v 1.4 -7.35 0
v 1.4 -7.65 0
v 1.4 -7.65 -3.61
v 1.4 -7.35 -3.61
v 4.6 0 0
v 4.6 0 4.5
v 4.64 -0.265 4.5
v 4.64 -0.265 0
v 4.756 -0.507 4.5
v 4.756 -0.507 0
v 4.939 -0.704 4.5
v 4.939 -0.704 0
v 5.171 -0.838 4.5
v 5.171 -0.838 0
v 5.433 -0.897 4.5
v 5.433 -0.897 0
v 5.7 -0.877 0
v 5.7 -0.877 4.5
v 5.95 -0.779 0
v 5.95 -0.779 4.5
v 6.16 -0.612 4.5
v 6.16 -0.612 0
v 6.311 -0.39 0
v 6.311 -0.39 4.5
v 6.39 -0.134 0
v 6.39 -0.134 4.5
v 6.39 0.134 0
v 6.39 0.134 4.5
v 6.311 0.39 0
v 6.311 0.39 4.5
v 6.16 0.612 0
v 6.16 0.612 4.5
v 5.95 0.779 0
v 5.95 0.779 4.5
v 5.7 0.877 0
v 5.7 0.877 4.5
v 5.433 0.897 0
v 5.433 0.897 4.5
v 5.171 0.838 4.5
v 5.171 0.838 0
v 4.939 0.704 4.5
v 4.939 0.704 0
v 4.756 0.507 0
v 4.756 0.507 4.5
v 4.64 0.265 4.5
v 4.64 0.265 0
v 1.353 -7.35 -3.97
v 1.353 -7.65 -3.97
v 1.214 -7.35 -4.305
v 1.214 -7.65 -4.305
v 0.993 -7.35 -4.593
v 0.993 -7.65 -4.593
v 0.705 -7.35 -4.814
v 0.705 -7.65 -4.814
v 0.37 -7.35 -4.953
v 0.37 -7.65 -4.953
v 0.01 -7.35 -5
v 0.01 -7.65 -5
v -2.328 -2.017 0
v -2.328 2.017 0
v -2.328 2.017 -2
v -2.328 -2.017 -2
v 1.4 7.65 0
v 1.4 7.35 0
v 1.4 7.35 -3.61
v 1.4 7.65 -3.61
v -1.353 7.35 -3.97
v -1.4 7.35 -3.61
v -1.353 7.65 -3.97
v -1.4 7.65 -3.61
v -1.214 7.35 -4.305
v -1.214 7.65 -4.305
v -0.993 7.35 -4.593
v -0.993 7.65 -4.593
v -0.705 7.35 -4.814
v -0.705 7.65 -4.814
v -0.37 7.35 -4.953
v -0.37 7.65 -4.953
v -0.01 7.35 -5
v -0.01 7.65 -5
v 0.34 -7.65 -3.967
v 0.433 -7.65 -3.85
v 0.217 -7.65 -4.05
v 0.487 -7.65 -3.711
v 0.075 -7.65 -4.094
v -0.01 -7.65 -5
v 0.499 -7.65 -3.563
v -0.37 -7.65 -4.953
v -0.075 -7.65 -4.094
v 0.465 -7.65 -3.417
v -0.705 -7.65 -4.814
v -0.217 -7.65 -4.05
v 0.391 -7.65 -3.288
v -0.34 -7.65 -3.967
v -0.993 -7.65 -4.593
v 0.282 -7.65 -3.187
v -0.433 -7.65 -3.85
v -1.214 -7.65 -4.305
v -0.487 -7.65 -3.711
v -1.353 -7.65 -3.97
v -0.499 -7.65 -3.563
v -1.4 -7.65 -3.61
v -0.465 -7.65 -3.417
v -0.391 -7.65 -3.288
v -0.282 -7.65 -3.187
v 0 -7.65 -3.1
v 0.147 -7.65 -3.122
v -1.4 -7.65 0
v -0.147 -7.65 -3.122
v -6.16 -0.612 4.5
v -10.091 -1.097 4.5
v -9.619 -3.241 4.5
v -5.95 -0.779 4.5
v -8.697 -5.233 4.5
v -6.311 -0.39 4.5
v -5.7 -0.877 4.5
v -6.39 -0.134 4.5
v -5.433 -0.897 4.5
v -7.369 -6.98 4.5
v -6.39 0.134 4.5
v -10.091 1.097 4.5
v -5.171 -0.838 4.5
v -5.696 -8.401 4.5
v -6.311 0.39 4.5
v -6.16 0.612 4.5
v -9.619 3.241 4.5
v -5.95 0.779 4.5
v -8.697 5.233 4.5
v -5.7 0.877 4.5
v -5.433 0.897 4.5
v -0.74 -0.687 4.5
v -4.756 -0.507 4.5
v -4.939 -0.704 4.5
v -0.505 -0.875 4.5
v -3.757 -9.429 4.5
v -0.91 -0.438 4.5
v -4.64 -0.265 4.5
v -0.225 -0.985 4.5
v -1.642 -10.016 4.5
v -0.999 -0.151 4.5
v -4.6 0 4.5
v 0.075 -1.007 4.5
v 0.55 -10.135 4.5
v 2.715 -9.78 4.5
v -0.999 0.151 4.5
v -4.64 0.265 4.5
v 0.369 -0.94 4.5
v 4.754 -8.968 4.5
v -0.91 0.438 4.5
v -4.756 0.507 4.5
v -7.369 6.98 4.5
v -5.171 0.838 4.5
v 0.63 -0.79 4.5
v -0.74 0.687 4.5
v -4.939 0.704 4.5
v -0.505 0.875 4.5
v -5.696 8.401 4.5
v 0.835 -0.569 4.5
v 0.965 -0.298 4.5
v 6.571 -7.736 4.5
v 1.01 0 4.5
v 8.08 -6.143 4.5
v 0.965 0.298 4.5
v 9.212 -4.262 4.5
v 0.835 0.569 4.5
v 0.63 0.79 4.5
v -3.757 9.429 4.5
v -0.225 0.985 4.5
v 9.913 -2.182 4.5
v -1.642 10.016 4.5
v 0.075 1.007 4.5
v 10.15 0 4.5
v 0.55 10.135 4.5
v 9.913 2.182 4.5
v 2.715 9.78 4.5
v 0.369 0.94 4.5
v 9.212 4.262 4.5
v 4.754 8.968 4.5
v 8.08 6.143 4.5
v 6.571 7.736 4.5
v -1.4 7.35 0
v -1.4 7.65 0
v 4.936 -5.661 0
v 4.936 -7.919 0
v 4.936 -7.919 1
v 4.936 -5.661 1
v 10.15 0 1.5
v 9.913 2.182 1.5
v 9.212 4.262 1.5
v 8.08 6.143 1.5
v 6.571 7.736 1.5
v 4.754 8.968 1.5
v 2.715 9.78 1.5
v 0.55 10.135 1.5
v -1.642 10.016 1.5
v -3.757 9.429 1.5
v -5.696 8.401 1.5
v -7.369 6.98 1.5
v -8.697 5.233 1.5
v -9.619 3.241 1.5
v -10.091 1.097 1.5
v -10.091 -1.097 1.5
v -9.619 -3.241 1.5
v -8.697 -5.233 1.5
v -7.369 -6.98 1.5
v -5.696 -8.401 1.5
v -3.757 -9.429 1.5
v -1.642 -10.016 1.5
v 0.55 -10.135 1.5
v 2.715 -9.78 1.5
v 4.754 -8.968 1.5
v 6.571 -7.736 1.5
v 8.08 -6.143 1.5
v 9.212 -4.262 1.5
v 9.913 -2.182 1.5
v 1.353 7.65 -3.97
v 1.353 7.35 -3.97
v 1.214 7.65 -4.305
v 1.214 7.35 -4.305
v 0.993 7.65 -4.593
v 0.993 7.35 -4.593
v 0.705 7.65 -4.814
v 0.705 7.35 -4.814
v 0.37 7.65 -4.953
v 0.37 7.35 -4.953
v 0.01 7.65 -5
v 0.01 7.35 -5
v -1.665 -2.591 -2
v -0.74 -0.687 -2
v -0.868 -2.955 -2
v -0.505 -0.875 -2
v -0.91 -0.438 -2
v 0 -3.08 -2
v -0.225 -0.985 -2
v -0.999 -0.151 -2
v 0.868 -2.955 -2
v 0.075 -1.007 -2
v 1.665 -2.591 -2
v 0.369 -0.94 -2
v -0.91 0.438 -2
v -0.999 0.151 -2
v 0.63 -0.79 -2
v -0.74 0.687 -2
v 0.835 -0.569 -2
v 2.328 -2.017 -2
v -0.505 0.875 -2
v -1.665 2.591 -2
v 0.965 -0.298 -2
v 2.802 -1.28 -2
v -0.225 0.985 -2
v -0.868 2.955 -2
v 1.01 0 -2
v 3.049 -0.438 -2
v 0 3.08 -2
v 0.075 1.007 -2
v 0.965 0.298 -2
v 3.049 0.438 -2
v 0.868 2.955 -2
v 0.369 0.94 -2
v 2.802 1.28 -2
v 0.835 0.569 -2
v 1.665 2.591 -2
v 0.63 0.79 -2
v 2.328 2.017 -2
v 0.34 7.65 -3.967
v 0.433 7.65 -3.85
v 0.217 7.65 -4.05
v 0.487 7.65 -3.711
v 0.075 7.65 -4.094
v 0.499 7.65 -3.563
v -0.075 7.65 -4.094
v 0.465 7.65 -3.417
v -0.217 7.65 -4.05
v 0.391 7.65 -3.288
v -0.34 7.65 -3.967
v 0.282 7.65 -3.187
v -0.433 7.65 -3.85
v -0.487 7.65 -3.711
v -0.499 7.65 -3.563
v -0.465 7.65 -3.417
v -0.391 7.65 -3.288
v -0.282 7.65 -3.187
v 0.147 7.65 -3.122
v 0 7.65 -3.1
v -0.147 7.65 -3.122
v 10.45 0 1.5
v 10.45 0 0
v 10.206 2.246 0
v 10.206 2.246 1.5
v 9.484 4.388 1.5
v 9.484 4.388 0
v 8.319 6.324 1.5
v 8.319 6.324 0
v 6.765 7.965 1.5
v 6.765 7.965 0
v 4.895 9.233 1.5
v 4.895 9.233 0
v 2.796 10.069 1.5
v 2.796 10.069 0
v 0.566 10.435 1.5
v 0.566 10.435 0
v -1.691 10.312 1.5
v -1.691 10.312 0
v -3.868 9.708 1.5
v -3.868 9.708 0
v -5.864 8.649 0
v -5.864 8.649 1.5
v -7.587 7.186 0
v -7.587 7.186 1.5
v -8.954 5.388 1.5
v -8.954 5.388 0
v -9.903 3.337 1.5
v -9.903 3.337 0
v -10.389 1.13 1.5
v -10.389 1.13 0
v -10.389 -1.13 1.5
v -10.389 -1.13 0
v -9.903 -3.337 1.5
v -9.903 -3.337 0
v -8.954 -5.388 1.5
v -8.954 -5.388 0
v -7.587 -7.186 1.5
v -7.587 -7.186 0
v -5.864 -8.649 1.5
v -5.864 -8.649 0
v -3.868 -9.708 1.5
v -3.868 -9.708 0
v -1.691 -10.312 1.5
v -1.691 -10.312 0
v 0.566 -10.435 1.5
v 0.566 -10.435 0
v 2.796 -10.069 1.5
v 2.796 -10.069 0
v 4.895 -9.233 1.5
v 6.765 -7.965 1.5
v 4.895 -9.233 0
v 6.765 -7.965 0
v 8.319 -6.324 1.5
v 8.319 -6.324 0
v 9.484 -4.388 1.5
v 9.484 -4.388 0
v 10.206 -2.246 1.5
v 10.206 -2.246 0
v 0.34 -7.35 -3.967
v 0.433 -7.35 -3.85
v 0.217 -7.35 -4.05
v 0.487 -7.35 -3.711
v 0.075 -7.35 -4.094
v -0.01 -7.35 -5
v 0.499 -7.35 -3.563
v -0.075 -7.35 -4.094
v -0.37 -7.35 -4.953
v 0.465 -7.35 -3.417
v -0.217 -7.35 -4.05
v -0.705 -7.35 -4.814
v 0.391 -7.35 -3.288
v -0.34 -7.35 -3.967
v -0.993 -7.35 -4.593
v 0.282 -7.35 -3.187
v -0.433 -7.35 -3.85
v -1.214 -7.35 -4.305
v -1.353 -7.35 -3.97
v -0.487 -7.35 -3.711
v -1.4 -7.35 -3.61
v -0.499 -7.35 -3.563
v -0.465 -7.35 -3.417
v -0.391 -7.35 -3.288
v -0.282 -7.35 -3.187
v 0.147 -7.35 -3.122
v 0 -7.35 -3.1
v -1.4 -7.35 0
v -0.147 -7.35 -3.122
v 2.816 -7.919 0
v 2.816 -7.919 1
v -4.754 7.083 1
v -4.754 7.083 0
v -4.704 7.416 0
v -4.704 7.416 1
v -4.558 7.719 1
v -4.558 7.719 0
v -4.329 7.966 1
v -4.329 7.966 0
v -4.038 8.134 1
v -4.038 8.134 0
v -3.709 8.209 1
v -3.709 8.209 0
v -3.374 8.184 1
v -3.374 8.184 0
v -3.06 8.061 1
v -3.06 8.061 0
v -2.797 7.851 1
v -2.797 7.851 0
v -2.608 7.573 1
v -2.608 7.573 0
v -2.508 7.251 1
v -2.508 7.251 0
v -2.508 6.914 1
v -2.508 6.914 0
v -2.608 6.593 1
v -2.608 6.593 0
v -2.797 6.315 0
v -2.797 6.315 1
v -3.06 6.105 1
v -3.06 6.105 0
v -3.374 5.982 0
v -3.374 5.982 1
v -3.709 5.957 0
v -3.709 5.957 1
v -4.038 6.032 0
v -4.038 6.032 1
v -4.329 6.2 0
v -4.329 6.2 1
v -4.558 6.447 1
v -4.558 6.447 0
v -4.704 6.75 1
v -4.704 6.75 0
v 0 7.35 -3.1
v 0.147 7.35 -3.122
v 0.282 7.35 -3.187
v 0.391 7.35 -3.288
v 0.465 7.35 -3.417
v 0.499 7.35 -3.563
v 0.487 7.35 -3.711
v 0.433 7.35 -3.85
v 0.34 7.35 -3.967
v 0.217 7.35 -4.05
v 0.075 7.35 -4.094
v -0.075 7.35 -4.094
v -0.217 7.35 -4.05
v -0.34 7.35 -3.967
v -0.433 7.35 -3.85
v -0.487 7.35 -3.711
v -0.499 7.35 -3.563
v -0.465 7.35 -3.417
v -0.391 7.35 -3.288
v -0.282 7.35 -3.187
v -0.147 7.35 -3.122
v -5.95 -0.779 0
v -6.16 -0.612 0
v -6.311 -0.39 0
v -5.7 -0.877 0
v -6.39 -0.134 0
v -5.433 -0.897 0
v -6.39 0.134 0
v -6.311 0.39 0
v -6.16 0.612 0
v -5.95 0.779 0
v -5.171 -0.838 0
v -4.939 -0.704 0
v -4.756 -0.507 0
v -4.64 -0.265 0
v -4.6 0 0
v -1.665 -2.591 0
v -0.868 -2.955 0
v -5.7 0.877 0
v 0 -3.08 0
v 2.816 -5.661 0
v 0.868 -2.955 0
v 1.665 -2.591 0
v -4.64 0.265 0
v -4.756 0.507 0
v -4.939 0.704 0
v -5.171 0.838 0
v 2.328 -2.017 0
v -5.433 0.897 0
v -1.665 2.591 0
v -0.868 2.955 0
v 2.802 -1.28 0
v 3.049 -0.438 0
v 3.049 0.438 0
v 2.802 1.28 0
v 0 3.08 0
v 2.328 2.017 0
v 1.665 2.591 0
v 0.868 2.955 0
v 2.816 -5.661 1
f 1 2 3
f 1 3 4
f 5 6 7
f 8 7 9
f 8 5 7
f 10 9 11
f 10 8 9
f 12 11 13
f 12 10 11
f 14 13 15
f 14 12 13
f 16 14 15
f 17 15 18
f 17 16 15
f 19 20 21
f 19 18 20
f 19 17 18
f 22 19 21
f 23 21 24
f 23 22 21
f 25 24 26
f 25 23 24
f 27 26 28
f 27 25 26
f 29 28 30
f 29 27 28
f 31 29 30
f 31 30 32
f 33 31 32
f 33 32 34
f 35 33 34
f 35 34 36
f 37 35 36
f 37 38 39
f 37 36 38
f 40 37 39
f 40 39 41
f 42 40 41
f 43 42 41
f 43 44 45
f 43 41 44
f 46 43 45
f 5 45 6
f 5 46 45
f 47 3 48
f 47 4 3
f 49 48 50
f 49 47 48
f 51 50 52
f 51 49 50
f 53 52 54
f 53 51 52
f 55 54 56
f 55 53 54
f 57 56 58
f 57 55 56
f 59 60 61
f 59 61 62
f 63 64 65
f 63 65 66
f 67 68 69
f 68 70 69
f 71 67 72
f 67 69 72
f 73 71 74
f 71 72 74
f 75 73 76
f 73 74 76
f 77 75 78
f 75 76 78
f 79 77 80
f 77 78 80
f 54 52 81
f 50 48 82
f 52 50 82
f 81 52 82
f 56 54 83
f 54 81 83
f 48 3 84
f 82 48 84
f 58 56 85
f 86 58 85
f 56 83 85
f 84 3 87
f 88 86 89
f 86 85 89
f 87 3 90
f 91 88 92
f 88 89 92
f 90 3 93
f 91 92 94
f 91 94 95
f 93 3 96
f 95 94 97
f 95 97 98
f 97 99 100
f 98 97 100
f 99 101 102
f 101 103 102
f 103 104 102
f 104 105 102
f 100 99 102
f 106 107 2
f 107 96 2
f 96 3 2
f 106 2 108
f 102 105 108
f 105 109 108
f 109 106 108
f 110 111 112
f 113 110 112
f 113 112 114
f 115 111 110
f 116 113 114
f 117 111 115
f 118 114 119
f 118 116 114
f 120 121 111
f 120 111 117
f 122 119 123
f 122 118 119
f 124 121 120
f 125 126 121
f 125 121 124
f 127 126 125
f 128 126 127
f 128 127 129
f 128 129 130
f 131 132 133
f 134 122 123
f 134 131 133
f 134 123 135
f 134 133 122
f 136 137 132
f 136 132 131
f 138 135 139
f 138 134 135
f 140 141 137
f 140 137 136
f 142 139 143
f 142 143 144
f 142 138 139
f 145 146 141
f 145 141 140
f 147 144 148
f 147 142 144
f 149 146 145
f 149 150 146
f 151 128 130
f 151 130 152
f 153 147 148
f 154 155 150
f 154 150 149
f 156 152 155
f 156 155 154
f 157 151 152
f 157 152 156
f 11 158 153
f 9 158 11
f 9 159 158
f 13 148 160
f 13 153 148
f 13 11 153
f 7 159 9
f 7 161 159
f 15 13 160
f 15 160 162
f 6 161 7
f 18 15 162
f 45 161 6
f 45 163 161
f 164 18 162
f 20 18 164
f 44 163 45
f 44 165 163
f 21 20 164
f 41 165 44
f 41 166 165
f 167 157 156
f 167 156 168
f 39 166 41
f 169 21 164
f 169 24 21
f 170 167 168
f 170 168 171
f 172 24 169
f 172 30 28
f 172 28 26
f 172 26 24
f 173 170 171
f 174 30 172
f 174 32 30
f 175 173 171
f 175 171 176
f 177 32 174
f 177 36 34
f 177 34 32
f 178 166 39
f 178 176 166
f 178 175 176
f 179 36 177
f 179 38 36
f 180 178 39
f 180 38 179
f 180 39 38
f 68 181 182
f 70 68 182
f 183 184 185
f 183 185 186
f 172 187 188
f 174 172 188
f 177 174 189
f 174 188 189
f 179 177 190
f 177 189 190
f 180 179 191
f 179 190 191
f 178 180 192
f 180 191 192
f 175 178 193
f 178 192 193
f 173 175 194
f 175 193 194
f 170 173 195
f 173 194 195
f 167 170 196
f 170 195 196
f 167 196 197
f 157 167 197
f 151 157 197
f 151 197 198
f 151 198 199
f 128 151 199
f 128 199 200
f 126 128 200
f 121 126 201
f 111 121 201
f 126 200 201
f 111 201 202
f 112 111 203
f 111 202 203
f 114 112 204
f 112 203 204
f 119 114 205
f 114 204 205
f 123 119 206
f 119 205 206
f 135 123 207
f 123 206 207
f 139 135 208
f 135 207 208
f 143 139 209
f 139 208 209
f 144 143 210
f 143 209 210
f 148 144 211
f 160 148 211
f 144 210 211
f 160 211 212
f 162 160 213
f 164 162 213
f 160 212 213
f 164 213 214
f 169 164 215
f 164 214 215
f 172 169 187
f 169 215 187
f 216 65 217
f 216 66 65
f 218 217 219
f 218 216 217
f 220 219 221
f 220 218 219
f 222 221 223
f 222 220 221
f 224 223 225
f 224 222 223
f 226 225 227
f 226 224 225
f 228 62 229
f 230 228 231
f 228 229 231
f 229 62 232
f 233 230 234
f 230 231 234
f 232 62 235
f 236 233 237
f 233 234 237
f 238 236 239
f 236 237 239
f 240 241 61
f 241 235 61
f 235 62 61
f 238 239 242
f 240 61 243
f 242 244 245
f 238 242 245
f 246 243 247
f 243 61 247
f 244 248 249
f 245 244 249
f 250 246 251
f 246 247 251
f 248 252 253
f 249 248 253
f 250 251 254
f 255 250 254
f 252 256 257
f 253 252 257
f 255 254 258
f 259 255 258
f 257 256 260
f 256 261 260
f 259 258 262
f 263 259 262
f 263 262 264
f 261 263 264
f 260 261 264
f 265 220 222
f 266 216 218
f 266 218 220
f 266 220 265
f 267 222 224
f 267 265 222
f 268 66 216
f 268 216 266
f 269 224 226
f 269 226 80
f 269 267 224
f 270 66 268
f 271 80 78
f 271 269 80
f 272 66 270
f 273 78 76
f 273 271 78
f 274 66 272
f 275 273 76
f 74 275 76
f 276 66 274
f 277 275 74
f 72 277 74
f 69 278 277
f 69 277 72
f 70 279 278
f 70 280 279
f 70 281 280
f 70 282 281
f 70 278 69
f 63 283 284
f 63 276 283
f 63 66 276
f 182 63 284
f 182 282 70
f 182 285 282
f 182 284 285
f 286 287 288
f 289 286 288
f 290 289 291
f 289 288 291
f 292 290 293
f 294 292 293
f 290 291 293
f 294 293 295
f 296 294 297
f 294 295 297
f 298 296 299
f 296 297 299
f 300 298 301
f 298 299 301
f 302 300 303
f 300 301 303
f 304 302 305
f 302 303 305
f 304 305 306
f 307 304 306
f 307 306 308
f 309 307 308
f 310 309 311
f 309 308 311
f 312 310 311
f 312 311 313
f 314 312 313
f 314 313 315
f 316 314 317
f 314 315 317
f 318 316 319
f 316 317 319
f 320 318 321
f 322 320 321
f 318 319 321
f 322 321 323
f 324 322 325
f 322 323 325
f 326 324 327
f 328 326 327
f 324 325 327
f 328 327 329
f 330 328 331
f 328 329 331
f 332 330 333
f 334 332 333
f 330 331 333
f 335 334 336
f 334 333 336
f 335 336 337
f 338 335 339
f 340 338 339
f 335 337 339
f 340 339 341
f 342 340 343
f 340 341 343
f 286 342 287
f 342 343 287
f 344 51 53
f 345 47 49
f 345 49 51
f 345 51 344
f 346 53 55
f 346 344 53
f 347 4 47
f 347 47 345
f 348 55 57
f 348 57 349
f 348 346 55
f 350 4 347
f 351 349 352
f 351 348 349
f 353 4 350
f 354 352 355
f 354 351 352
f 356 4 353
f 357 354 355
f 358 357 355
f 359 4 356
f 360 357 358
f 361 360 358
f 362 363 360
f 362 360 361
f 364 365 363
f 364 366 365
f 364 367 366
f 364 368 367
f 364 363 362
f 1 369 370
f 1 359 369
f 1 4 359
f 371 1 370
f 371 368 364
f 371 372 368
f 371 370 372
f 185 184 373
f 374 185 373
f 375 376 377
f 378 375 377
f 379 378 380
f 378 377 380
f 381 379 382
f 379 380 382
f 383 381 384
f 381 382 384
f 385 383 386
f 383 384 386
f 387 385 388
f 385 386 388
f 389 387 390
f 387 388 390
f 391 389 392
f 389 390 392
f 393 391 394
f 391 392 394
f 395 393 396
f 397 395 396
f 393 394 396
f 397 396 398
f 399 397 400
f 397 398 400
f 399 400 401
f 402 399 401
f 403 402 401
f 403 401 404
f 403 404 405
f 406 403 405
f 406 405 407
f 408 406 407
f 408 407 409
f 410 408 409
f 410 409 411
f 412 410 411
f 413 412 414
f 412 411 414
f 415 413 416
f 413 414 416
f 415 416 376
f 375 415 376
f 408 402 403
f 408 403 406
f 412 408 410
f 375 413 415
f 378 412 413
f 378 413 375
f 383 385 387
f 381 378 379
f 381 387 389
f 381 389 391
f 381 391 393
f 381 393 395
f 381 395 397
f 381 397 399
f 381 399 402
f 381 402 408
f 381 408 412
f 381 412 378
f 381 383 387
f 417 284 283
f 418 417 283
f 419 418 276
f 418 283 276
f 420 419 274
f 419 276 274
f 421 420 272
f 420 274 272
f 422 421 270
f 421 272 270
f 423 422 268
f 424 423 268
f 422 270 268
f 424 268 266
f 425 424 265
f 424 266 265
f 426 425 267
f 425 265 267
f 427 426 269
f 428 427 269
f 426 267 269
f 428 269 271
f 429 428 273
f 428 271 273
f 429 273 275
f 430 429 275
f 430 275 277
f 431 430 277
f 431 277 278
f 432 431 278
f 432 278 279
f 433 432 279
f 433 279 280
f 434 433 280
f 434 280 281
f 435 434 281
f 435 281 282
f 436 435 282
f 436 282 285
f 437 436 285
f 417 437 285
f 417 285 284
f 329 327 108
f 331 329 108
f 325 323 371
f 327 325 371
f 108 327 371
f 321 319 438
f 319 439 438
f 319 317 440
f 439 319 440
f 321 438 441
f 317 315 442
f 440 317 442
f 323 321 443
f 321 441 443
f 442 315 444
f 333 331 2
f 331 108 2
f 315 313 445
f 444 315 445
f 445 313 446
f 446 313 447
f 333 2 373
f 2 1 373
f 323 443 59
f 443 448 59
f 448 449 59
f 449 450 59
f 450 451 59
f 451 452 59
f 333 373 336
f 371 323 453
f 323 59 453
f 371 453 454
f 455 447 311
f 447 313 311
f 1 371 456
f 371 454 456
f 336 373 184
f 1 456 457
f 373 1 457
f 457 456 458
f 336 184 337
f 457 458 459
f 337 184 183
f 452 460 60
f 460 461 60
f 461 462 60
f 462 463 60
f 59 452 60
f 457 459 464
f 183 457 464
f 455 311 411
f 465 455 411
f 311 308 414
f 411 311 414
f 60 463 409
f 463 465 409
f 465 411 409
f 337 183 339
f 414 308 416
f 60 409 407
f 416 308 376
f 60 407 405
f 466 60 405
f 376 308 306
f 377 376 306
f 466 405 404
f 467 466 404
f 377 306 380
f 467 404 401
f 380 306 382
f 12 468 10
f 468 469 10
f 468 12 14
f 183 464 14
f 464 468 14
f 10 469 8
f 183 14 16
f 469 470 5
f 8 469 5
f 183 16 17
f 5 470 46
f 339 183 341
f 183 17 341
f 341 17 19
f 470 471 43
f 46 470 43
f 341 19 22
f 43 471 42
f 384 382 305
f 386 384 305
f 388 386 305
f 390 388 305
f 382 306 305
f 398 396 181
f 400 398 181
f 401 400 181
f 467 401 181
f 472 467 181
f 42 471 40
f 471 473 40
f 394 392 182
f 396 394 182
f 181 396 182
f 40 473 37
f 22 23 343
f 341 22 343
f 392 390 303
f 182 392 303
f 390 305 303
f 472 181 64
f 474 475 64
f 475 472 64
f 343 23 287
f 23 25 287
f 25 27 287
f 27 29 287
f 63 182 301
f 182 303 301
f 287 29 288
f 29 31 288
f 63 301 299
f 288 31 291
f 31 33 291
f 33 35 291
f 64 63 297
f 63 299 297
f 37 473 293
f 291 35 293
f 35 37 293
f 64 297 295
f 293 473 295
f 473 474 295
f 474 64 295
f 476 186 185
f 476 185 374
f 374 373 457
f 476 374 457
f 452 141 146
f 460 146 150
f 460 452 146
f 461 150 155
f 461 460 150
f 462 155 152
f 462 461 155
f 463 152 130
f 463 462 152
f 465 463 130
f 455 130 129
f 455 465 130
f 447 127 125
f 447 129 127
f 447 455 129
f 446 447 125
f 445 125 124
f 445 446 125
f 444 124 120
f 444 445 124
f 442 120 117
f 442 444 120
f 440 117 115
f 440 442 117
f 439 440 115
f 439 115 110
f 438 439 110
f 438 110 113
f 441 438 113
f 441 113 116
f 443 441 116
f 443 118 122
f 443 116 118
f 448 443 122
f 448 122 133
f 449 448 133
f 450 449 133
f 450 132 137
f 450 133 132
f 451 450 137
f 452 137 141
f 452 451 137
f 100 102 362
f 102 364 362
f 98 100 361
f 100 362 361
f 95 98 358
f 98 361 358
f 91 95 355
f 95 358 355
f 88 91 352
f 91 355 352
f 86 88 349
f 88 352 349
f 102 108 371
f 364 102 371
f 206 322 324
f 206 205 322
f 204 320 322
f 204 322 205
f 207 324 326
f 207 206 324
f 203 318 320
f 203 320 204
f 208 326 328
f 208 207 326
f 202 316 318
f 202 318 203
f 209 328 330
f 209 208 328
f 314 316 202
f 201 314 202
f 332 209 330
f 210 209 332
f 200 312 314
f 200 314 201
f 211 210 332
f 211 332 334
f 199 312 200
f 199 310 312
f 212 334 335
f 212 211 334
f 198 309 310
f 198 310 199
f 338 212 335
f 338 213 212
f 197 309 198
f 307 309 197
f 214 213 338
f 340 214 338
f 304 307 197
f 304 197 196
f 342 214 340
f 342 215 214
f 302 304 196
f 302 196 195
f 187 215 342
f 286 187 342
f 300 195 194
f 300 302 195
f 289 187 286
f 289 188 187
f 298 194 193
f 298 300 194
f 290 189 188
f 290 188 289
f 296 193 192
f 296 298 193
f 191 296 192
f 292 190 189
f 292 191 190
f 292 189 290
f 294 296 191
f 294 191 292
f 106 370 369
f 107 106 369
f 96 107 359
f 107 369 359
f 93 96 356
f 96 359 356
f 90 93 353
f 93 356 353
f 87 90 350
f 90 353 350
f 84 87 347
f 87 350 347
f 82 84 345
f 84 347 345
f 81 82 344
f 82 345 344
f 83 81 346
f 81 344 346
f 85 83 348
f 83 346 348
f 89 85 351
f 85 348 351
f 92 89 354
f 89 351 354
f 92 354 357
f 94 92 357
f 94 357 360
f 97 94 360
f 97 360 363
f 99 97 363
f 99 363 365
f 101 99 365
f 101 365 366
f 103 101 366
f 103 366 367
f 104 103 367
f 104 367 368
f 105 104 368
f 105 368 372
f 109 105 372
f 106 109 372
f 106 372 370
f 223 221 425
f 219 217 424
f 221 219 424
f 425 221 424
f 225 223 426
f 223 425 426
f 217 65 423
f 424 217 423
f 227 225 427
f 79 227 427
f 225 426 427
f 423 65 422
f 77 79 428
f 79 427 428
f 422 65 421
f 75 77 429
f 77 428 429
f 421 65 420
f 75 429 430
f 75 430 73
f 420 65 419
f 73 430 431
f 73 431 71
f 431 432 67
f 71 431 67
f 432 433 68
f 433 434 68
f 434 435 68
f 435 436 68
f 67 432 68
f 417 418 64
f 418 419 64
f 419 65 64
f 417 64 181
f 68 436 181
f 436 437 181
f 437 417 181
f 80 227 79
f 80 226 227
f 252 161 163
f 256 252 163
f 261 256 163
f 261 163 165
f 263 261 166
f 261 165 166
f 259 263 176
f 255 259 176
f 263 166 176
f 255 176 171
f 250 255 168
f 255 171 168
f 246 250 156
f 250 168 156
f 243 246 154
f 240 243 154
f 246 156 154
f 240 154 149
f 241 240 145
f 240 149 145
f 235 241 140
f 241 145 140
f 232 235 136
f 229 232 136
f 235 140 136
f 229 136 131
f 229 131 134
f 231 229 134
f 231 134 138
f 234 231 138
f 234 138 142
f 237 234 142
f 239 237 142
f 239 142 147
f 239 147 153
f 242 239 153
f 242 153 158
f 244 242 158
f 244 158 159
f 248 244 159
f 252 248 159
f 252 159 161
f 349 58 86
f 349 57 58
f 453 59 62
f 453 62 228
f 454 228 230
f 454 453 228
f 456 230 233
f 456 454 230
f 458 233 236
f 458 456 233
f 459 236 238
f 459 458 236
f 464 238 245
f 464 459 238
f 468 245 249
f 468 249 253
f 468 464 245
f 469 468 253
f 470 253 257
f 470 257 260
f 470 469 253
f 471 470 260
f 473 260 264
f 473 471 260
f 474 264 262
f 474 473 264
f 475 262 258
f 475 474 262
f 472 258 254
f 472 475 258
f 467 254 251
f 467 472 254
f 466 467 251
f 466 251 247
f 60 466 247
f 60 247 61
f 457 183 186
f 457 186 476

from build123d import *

# Parameters (mm, degrees)
ESQUISSE1_R             = 10.45
BASE_EXTRUSION_DEPTH    = 1.5
ESQUISSE2_R             = 10.15
BOSS_EXTRU_1_DEPTH      = 3
ESQUISSE4_R             = 0.9
ENL_V_MAT_EXTRU_2_DEPTH = 16.448462707
BOSS_EXTRU_3_DEPTH      = 2
ESQUISSE3_R             = 1.01
ENL_V_MAT_EXTRU_1_DEPTH = 17.144813409
ESQUISSE7_W             = 2.8
ESQUISSE7_H             = 0.3
BOSS_EXTRU_4_DEPTH      = 5
CONG_1_R                = 1.39
ESQUISSE8_R             = 0.5
ENL_V_MAT_EXTRU_3_DEPTH = 22.489823173
ESQUISSE9_R             = 1.129243381
ESQUISSE9_W             = 2.119235508
ESQUISSE9_H             = 2.258658896
ENL_V_MAT_EXTRU_4_DEPTH = 1


with BuildPart() as part:
    # Esquisse1 → Base-Extrusion (new body)
    with BuildSketch(Plane.XY):
        Circle(ESQUISSE1_R)
    extrude(amount=BASE_EXTRUSION_DEPTH)

    # Esquisse2 → Boss.-Extru.1 (add)
    with BuildSketch(Plane.XY.offset(1.5)):
        Circle(ESQUISSE2_R)
    extrude(amount=BOSS_EXTRU_1_DEPTH)

    # Esquisse4 (on Front Plane) → Enlèv. mat.-Extru.2 (cut, through all)
    with BuildSketch(Plane.XY):
        with Locations((-5.5, 0)):
            Circle(ESQUISSE4_R)
        with Locations(Location((5.5, 0, 0), (0, 0, 180))):
            Circle(ESQUISSE4_R)
    extrude(amount=ENL_V_MAT_EXTRU_2_DEPTH, mode=Mode.SUBTRACT)

    # Esquisse6 → Boss.-Extru.3 (add)
    with BuildSketch(Plane(origin=(0, 0, 0), x_dir=(-1, 0, 0), z_dir=(0, 0, -1))):
        with BuildLine():
            Line((2.327994108, 2.016641622), (2.327994108, -2.016641622))
            ThreePointArc((2.327994108, -2.016641622), (-3.08, 0), (2.327994108, 2.016641622))
        make_face()
    extrude(amount=BOSS_EXTRU_3_DEPTH)

    # Esquisse3 → Enlèv. mat.-Extru.1 (cut, through all)
    with BuildSketch(Plane.XY.offset(4.5)):
        Circle(ESQUISSE3_R)
    extrude(amount=-ENL_V_MAT_EXTRU_1_DEPTH, mode=Mode.SUBTRACT)

    # Esquisse7 → Boss.-Extru.4 (add)
    with BuildSketch(Plane(origin=(0, 0, 0), x_dir=(-1, 0, 0), z_dir=(0, 0, -1))):
        with Locations((0, 7.5)):
            Rectangle(ESQUISSE7_W, ESQUISSE7_H)
        with Locations((0, -7.5)):
            Rectangle(ESQUISSE7_W, ESQUISSE7_H)
    extrude(amount=BOSS_EXTRU_4_DEPTH)

    # Congé1
    cong_1_edges = [part.edges().sort_by_distance(p)[0] for p in [
        (-1.4, -7.5, -5),
        (1.4, -7.5, -5),
        (1.4, 7.5, -5),
        (-1.4, 7.5, -5),
    ]]
    fillet(cong_1_edges, radius=CONG_1_R)

    # Esquisse8 → Enlèv. mat.-Extru.3 (cut, through all)
    with BuildSketch(Plane(origin=(0, 7.65, 0), x_dir=(-1, 0, 0), z_dir=(0, 1, 0))):
        with Locations(Location((0, -3.6, 0), (0, 0, 90))):
            Circle(ESQUISSE8_R)
    extrude(amount=-ENL_V_MAT_EXTRU_3_DEPTH, mode=Mode.SUBTRACT)

    # Esquisse9 → Enlèv. mat.-Extru.4 (cut)
    with BuildSketch(Plane(origin=(0, 0, 0), x_dir=(-1, 0, 0), z_dir=(0, 0, -1))):
        with Locations((3.625008105, 7.082708144)):
            Circle(ESQUISSE9_R)
        with Locations((-3.875970205, -6.789919028)):
            Rectangle(ESQUISSE9_W, ESQUISSE9_H)
    extrude(amount=-ENL_V_MAT_EXTRU_4_DEPTH, mode=Mode.SUBTRACT)


solid = part.part
